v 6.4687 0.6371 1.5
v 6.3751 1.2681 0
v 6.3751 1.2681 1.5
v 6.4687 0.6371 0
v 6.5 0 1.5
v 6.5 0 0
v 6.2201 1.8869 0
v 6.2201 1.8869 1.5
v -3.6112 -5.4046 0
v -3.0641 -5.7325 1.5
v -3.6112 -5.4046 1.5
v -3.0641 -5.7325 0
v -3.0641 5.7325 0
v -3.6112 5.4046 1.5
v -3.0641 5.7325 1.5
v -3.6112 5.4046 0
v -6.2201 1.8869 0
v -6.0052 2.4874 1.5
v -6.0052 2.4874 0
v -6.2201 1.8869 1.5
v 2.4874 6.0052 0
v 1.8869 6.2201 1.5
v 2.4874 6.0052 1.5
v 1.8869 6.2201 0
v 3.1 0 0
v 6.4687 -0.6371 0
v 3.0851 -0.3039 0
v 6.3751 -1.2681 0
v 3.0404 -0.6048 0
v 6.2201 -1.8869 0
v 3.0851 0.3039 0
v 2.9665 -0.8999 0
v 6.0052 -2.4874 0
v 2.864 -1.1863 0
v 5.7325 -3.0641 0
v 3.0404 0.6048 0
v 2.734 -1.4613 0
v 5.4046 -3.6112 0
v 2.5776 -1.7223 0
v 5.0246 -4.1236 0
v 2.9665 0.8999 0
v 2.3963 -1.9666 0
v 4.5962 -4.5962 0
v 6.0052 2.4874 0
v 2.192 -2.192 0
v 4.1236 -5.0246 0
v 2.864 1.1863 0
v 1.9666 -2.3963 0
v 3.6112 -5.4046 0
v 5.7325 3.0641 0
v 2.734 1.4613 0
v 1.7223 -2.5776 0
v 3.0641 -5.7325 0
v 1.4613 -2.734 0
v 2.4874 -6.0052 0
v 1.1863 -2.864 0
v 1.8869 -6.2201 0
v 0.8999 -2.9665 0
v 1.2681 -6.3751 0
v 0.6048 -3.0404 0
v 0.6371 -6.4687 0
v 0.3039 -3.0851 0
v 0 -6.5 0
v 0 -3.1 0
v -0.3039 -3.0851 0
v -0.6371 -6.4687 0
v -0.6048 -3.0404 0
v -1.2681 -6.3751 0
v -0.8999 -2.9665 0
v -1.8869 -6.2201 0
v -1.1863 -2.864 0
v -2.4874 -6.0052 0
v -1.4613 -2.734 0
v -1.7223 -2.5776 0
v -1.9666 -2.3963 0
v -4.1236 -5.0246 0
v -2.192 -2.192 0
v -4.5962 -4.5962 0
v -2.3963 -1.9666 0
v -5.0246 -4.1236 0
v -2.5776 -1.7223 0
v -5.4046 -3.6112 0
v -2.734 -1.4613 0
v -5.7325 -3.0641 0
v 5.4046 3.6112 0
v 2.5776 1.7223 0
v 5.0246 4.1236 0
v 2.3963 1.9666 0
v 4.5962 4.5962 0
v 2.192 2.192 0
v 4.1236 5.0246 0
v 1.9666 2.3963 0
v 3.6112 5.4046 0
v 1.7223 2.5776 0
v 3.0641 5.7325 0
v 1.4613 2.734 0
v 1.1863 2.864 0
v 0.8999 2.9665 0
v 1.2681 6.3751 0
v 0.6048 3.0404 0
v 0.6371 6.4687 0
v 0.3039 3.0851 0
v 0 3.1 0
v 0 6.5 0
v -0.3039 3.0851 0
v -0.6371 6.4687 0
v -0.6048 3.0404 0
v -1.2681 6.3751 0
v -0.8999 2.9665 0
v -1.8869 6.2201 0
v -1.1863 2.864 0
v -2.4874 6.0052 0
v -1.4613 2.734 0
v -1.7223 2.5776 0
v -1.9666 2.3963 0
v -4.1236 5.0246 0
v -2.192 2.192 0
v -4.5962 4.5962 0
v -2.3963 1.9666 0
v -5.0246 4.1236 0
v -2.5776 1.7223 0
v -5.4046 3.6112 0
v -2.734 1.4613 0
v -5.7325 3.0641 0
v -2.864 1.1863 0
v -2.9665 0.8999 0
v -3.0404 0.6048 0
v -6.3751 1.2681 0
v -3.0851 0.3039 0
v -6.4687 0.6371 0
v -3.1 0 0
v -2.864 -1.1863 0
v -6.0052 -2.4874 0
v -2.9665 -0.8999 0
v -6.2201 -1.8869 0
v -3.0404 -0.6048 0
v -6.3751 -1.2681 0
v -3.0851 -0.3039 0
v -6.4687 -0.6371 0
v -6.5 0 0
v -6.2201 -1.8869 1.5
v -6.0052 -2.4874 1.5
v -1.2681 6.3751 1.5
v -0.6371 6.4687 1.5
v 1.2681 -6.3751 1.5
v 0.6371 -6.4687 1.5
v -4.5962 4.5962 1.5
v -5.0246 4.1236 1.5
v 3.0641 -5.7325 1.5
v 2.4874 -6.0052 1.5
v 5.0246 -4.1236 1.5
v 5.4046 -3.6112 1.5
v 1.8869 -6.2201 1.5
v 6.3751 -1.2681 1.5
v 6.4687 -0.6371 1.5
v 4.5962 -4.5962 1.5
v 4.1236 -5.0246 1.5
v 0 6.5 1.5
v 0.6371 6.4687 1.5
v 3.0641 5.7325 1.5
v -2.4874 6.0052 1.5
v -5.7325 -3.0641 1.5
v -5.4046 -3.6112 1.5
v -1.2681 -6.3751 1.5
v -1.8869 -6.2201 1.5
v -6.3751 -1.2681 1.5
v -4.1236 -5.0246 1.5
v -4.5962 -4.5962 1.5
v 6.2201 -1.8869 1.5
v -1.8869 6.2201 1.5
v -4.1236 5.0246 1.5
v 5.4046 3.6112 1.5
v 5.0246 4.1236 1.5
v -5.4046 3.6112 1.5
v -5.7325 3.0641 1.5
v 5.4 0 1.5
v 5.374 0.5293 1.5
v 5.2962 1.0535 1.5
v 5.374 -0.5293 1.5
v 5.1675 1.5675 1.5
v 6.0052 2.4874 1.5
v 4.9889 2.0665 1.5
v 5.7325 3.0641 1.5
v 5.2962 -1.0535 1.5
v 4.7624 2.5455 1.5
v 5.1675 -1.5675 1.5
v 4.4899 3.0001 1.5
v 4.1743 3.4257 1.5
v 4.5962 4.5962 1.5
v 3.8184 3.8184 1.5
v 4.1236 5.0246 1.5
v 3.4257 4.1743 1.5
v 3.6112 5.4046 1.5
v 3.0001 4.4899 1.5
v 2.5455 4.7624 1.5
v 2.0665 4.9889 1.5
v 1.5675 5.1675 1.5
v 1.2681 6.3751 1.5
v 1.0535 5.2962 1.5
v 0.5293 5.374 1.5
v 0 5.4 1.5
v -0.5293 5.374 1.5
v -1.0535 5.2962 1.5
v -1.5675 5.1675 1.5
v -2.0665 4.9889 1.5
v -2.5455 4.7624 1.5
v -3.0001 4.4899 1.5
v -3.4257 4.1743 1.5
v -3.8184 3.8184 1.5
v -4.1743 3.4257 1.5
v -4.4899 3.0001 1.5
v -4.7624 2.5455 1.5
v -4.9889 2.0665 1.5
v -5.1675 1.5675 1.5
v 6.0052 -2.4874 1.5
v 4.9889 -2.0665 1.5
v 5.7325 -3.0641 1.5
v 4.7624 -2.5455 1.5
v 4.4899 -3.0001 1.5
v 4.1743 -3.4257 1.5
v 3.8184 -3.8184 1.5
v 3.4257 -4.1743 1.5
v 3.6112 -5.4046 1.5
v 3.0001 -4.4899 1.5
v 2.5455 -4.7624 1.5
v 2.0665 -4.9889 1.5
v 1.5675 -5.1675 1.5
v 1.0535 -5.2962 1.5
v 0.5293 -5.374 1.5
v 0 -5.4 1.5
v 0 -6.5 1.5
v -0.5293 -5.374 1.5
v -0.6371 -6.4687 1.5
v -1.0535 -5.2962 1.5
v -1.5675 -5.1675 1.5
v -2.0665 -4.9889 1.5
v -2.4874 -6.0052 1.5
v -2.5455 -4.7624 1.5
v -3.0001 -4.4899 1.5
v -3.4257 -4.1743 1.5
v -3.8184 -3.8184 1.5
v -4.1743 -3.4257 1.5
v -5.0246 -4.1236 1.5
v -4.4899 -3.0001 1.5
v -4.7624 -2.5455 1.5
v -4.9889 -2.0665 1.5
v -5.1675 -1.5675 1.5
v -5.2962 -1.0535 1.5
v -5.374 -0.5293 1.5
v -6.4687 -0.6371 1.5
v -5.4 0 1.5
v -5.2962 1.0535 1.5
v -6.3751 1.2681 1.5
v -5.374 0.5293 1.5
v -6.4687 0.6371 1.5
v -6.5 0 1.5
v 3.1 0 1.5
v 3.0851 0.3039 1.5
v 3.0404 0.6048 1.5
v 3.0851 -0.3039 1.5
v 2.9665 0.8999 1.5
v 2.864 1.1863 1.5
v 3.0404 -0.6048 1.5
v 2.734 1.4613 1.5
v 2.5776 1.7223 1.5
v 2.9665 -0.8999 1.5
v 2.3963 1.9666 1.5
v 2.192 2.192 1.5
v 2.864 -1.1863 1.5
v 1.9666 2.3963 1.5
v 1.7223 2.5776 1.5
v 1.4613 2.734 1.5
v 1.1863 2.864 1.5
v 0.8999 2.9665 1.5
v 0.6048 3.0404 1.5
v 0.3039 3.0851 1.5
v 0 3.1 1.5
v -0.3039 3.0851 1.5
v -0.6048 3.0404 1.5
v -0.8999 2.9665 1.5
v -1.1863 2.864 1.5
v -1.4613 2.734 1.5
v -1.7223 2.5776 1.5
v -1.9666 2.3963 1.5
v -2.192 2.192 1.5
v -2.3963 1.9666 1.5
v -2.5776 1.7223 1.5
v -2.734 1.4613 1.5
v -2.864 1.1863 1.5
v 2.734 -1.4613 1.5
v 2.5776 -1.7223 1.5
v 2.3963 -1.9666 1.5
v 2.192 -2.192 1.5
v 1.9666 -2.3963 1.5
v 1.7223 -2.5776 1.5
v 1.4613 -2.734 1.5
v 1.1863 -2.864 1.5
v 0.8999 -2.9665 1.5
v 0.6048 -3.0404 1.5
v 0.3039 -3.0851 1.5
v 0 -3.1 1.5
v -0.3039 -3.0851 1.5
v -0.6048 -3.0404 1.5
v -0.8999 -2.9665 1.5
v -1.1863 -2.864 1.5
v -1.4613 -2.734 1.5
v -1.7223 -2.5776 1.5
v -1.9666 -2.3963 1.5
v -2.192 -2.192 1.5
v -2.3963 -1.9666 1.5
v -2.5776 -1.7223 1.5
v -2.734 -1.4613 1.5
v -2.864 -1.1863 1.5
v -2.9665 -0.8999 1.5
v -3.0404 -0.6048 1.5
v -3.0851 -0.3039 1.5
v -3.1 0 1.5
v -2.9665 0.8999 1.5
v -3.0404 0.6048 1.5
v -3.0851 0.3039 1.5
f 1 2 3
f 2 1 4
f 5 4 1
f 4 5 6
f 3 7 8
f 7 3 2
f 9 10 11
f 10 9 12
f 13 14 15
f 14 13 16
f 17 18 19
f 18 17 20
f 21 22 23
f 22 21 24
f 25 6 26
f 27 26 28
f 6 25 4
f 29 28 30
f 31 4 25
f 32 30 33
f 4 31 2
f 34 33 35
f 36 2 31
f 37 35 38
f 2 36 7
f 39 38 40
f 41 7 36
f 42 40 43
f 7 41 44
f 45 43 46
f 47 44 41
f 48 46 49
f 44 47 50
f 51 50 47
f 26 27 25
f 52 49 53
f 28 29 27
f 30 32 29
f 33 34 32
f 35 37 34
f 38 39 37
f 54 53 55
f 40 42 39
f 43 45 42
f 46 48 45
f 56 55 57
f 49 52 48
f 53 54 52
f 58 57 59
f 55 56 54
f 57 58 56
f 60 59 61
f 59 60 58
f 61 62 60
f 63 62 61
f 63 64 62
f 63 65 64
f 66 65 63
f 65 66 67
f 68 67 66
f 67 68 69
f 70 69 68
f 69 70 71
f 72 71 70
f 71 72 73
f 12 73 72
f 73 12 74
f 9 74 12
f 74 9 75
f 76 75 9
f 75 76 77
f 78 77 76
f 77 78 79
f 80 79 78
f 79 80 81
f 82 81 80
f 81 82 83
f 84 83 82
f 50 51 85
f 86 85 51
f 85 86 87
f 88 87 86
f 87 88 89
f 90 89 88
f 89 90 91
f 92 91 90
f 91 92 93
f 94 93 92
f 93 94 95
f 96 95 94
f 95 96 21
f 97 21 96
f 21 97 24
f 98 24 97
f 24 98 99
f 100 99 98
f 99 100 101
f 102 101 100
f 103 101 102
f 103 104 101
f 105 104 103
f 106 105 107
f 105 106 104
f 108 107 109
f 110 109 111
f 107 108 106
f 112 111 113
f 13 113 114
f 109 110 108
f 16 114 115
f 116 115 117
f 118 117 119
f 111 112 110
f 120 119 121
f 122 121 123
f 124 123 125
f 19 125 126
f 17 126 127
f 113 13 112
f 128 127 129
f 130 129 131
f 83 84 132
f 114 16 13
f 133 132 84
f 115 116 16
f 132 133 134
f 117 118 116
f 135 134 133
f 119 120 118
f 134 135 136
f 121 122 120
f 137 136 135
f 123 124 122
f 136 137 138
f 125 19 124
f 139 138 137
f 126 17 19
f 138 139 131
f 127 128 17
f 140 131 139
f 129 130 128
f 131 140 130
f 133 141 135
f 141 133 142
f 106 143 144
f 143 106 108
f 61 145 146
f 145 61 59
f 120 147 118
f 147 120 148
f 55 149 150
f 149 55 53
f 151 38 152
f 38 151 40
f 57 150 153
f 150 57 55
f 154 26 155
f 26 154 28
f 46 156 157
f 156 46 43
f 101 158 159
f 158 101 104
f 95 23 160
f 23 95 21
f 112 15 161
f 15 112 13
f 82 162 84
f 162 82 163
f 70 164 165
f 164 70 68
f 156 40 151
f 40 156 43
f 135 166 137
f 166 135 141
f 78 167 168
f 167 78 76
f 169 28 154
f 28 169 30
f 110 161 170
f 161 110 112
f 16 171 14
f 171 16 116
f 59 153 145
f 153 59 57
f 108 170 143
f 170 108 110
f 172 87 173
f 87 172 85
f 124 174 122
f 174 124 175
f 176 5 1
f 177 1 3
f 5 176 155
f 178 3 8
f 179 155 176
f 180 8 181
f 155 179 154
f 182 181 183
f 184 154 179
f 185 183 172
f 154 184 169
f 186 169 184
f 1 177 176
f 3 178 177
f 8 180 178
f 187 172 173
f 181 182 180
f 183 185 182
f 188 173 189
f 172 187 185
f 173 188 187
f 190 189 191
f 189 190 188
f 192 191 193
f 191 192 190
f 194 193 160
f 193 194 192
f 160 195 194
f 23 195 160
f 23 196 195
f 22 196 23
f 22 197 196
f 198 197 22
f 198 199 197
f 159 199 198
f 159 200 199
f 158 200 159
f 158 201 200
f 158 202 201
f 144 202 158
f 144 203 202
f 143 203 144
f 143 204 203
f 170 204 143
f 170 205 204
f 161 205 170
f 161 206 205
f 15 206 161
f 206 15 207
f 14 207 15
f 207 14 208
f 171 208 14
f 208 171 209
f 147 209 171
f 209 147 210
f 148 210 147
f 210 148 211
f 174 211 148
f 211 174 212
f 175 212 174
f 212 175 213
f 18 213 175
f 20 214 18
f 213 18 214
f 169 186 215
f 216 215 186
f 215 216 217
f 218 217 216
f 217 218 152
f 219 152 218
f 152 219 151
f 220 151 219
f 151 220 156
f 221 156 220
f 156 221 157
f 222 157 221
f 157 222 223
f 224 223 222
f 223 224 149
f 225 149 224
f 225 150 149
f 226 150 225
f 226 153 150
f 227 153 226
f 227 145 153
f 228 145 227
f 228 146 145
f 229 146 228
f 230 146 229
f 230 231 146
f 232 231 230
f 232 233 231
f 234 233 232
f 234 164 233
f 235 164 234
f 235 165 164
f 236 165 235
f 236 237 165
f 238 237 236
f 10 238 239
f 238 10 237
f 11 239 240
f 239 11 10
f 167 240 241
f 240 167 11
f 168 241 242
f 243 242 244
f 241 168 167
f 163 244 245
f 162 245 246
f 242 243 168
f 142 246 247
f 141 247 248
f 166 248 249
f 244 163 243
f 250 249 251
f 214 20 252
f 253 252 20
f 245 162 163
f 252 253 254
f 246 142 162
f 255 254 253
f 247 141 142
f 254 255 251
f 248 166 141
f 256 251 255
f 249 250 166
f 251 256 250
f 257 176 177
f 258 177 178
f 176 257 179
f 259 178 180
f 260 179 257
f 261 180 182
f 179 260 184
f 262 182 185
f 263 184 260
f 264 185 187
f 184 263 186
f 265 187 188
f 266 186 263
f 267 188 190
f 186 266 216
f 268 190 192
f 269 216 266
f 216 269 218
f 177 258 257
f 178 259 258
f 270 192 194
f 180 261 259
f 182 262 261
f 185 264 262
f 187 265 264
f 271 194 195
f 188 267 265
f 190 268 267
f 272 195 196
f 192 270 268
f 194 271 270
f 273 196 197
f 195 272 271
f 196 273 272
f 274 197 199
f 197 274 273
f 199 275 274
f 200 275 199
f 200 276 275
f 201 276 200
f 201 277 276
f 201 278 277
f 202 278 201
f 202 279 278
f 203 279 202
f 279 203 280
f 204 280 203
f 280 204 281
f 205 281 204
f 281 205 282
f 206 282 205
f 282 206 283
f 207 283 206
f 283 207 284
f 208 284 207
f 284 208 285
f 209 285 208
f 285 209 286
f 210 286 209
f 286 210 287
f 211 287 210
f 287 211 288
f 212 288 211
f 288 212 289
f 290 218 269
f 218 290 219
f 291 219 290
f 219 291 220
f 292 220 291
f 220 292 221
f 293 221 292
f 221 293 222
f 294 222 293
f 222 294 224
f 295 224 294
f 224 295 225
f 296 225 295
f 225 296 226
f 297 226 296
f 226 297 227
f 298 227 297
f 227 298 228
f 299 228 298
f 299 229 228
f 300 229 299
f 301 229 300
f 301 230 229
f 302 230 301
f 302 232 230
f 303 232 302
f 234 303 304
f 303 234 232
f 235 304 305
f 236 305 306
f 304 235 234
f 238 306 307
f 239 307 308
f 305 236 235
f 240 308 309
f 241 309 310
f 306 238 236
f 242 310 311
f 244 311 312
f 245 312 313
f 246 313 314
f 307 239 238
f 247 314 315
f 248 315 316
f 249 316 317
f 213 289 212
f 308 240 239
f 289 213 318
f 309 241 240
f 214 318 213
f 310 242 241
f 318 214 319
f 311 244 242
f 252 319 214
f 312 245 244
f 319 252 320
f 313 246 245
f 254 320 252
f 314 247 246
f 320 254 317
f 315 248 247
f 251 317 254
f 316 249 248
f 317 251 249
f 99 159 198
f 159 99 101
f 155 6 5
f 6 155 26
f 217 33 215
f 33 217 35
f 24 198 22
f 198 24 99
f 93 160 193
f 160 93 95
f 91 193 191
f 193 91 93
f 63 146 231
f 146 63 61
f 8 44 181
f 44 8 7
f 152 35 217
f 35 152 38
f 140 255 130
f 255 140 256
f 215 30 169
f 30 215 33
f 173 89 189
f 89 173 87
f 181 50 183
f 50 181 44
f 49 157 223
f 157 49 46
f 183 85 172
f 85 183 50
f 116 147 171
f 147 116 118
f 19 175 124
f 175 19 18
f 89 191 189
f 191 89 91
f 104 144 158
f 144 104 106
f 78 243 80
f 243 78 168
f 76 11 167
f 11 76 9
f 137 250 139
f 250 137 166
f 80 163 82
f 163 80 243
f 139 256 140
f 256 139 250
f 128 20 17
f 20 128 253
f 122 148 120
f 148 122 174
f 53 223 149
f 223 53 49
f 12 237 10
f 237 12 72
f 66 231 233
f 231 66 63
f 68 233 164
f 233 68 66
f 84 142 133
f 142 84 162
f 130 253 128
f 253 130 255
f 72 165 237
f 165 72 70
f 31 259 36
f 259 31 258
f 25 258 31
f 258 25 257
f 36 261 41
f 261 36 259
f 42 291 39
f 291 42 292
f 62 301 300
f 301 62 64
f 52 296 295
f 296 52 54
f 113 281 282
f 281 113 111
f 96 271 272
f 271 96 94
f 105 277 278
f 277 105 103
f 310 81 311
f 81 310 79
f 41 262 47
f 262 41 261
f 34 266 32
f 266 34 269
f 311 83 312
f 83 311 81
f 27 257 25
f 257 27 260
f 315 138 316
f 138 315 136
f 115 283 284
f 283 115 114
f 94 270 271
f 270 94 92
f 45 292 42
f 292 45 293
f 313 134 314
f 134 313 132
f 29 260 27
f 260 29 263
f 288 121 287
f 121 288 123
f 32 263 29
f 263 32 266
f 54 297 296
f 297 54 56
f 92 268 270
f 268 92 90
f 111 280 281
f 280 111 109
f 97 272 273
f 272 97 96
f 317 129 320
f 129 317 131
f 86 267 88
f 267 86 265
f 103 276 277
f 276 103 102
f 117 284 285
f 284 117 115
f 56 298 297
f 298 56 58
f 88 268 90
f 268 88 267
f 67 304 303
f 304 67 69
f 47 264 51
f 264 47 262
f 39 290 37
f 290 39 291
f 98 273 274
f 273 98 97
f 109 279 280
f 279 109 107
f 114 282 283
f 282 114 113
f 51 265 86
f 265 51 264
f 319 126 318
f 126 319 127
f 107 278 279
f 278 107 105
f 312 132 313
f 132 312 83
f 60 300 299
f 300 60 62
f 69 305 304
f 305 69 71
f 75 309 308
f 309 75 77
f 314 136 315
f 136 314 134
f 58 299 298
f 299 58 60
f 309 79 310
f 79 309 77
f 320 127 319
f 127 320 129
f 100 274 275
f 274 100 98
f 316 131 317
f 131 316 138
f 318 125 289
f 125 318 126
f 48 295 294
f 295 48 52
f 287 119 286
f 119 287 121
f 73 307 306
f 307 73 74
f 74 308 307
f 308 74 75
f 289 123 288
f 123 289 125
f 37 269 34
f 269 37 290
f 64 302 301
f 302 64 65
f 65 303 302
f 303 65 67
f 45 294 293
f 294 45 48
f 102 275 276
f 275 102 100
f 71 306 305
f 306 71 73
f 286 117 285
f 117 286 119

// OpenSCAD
// Adapter sleeve for 0.2 mL PCR tube in 1.5 mL rack hole
// Printed upside down: collar on bed, sleeve rises up

// Collar dimensions
collar_d = 13;
collar_h = 1.5;

// Sleeve dimensions
sleeve_od = 10.8;
total_h = 21.5;
sleeve_h = total_h - collar_h;

// Bore dimensions
bore_d = 6.2;
bore_h = total_h + 0.1;

// Build part
difference() {
    // Collar
    cylinder(d=collar_d, h=collar_h, $fn=64);
    
    // Sleeve body
    translate([0, 0, collar_h]) {
        cylinder(d=sleeve_od, h=sleeve_h, $fn=64);
    }
    
    // Cut bore
    cylinder(d=bore_d, h=bore_h, $fn=64);
}
